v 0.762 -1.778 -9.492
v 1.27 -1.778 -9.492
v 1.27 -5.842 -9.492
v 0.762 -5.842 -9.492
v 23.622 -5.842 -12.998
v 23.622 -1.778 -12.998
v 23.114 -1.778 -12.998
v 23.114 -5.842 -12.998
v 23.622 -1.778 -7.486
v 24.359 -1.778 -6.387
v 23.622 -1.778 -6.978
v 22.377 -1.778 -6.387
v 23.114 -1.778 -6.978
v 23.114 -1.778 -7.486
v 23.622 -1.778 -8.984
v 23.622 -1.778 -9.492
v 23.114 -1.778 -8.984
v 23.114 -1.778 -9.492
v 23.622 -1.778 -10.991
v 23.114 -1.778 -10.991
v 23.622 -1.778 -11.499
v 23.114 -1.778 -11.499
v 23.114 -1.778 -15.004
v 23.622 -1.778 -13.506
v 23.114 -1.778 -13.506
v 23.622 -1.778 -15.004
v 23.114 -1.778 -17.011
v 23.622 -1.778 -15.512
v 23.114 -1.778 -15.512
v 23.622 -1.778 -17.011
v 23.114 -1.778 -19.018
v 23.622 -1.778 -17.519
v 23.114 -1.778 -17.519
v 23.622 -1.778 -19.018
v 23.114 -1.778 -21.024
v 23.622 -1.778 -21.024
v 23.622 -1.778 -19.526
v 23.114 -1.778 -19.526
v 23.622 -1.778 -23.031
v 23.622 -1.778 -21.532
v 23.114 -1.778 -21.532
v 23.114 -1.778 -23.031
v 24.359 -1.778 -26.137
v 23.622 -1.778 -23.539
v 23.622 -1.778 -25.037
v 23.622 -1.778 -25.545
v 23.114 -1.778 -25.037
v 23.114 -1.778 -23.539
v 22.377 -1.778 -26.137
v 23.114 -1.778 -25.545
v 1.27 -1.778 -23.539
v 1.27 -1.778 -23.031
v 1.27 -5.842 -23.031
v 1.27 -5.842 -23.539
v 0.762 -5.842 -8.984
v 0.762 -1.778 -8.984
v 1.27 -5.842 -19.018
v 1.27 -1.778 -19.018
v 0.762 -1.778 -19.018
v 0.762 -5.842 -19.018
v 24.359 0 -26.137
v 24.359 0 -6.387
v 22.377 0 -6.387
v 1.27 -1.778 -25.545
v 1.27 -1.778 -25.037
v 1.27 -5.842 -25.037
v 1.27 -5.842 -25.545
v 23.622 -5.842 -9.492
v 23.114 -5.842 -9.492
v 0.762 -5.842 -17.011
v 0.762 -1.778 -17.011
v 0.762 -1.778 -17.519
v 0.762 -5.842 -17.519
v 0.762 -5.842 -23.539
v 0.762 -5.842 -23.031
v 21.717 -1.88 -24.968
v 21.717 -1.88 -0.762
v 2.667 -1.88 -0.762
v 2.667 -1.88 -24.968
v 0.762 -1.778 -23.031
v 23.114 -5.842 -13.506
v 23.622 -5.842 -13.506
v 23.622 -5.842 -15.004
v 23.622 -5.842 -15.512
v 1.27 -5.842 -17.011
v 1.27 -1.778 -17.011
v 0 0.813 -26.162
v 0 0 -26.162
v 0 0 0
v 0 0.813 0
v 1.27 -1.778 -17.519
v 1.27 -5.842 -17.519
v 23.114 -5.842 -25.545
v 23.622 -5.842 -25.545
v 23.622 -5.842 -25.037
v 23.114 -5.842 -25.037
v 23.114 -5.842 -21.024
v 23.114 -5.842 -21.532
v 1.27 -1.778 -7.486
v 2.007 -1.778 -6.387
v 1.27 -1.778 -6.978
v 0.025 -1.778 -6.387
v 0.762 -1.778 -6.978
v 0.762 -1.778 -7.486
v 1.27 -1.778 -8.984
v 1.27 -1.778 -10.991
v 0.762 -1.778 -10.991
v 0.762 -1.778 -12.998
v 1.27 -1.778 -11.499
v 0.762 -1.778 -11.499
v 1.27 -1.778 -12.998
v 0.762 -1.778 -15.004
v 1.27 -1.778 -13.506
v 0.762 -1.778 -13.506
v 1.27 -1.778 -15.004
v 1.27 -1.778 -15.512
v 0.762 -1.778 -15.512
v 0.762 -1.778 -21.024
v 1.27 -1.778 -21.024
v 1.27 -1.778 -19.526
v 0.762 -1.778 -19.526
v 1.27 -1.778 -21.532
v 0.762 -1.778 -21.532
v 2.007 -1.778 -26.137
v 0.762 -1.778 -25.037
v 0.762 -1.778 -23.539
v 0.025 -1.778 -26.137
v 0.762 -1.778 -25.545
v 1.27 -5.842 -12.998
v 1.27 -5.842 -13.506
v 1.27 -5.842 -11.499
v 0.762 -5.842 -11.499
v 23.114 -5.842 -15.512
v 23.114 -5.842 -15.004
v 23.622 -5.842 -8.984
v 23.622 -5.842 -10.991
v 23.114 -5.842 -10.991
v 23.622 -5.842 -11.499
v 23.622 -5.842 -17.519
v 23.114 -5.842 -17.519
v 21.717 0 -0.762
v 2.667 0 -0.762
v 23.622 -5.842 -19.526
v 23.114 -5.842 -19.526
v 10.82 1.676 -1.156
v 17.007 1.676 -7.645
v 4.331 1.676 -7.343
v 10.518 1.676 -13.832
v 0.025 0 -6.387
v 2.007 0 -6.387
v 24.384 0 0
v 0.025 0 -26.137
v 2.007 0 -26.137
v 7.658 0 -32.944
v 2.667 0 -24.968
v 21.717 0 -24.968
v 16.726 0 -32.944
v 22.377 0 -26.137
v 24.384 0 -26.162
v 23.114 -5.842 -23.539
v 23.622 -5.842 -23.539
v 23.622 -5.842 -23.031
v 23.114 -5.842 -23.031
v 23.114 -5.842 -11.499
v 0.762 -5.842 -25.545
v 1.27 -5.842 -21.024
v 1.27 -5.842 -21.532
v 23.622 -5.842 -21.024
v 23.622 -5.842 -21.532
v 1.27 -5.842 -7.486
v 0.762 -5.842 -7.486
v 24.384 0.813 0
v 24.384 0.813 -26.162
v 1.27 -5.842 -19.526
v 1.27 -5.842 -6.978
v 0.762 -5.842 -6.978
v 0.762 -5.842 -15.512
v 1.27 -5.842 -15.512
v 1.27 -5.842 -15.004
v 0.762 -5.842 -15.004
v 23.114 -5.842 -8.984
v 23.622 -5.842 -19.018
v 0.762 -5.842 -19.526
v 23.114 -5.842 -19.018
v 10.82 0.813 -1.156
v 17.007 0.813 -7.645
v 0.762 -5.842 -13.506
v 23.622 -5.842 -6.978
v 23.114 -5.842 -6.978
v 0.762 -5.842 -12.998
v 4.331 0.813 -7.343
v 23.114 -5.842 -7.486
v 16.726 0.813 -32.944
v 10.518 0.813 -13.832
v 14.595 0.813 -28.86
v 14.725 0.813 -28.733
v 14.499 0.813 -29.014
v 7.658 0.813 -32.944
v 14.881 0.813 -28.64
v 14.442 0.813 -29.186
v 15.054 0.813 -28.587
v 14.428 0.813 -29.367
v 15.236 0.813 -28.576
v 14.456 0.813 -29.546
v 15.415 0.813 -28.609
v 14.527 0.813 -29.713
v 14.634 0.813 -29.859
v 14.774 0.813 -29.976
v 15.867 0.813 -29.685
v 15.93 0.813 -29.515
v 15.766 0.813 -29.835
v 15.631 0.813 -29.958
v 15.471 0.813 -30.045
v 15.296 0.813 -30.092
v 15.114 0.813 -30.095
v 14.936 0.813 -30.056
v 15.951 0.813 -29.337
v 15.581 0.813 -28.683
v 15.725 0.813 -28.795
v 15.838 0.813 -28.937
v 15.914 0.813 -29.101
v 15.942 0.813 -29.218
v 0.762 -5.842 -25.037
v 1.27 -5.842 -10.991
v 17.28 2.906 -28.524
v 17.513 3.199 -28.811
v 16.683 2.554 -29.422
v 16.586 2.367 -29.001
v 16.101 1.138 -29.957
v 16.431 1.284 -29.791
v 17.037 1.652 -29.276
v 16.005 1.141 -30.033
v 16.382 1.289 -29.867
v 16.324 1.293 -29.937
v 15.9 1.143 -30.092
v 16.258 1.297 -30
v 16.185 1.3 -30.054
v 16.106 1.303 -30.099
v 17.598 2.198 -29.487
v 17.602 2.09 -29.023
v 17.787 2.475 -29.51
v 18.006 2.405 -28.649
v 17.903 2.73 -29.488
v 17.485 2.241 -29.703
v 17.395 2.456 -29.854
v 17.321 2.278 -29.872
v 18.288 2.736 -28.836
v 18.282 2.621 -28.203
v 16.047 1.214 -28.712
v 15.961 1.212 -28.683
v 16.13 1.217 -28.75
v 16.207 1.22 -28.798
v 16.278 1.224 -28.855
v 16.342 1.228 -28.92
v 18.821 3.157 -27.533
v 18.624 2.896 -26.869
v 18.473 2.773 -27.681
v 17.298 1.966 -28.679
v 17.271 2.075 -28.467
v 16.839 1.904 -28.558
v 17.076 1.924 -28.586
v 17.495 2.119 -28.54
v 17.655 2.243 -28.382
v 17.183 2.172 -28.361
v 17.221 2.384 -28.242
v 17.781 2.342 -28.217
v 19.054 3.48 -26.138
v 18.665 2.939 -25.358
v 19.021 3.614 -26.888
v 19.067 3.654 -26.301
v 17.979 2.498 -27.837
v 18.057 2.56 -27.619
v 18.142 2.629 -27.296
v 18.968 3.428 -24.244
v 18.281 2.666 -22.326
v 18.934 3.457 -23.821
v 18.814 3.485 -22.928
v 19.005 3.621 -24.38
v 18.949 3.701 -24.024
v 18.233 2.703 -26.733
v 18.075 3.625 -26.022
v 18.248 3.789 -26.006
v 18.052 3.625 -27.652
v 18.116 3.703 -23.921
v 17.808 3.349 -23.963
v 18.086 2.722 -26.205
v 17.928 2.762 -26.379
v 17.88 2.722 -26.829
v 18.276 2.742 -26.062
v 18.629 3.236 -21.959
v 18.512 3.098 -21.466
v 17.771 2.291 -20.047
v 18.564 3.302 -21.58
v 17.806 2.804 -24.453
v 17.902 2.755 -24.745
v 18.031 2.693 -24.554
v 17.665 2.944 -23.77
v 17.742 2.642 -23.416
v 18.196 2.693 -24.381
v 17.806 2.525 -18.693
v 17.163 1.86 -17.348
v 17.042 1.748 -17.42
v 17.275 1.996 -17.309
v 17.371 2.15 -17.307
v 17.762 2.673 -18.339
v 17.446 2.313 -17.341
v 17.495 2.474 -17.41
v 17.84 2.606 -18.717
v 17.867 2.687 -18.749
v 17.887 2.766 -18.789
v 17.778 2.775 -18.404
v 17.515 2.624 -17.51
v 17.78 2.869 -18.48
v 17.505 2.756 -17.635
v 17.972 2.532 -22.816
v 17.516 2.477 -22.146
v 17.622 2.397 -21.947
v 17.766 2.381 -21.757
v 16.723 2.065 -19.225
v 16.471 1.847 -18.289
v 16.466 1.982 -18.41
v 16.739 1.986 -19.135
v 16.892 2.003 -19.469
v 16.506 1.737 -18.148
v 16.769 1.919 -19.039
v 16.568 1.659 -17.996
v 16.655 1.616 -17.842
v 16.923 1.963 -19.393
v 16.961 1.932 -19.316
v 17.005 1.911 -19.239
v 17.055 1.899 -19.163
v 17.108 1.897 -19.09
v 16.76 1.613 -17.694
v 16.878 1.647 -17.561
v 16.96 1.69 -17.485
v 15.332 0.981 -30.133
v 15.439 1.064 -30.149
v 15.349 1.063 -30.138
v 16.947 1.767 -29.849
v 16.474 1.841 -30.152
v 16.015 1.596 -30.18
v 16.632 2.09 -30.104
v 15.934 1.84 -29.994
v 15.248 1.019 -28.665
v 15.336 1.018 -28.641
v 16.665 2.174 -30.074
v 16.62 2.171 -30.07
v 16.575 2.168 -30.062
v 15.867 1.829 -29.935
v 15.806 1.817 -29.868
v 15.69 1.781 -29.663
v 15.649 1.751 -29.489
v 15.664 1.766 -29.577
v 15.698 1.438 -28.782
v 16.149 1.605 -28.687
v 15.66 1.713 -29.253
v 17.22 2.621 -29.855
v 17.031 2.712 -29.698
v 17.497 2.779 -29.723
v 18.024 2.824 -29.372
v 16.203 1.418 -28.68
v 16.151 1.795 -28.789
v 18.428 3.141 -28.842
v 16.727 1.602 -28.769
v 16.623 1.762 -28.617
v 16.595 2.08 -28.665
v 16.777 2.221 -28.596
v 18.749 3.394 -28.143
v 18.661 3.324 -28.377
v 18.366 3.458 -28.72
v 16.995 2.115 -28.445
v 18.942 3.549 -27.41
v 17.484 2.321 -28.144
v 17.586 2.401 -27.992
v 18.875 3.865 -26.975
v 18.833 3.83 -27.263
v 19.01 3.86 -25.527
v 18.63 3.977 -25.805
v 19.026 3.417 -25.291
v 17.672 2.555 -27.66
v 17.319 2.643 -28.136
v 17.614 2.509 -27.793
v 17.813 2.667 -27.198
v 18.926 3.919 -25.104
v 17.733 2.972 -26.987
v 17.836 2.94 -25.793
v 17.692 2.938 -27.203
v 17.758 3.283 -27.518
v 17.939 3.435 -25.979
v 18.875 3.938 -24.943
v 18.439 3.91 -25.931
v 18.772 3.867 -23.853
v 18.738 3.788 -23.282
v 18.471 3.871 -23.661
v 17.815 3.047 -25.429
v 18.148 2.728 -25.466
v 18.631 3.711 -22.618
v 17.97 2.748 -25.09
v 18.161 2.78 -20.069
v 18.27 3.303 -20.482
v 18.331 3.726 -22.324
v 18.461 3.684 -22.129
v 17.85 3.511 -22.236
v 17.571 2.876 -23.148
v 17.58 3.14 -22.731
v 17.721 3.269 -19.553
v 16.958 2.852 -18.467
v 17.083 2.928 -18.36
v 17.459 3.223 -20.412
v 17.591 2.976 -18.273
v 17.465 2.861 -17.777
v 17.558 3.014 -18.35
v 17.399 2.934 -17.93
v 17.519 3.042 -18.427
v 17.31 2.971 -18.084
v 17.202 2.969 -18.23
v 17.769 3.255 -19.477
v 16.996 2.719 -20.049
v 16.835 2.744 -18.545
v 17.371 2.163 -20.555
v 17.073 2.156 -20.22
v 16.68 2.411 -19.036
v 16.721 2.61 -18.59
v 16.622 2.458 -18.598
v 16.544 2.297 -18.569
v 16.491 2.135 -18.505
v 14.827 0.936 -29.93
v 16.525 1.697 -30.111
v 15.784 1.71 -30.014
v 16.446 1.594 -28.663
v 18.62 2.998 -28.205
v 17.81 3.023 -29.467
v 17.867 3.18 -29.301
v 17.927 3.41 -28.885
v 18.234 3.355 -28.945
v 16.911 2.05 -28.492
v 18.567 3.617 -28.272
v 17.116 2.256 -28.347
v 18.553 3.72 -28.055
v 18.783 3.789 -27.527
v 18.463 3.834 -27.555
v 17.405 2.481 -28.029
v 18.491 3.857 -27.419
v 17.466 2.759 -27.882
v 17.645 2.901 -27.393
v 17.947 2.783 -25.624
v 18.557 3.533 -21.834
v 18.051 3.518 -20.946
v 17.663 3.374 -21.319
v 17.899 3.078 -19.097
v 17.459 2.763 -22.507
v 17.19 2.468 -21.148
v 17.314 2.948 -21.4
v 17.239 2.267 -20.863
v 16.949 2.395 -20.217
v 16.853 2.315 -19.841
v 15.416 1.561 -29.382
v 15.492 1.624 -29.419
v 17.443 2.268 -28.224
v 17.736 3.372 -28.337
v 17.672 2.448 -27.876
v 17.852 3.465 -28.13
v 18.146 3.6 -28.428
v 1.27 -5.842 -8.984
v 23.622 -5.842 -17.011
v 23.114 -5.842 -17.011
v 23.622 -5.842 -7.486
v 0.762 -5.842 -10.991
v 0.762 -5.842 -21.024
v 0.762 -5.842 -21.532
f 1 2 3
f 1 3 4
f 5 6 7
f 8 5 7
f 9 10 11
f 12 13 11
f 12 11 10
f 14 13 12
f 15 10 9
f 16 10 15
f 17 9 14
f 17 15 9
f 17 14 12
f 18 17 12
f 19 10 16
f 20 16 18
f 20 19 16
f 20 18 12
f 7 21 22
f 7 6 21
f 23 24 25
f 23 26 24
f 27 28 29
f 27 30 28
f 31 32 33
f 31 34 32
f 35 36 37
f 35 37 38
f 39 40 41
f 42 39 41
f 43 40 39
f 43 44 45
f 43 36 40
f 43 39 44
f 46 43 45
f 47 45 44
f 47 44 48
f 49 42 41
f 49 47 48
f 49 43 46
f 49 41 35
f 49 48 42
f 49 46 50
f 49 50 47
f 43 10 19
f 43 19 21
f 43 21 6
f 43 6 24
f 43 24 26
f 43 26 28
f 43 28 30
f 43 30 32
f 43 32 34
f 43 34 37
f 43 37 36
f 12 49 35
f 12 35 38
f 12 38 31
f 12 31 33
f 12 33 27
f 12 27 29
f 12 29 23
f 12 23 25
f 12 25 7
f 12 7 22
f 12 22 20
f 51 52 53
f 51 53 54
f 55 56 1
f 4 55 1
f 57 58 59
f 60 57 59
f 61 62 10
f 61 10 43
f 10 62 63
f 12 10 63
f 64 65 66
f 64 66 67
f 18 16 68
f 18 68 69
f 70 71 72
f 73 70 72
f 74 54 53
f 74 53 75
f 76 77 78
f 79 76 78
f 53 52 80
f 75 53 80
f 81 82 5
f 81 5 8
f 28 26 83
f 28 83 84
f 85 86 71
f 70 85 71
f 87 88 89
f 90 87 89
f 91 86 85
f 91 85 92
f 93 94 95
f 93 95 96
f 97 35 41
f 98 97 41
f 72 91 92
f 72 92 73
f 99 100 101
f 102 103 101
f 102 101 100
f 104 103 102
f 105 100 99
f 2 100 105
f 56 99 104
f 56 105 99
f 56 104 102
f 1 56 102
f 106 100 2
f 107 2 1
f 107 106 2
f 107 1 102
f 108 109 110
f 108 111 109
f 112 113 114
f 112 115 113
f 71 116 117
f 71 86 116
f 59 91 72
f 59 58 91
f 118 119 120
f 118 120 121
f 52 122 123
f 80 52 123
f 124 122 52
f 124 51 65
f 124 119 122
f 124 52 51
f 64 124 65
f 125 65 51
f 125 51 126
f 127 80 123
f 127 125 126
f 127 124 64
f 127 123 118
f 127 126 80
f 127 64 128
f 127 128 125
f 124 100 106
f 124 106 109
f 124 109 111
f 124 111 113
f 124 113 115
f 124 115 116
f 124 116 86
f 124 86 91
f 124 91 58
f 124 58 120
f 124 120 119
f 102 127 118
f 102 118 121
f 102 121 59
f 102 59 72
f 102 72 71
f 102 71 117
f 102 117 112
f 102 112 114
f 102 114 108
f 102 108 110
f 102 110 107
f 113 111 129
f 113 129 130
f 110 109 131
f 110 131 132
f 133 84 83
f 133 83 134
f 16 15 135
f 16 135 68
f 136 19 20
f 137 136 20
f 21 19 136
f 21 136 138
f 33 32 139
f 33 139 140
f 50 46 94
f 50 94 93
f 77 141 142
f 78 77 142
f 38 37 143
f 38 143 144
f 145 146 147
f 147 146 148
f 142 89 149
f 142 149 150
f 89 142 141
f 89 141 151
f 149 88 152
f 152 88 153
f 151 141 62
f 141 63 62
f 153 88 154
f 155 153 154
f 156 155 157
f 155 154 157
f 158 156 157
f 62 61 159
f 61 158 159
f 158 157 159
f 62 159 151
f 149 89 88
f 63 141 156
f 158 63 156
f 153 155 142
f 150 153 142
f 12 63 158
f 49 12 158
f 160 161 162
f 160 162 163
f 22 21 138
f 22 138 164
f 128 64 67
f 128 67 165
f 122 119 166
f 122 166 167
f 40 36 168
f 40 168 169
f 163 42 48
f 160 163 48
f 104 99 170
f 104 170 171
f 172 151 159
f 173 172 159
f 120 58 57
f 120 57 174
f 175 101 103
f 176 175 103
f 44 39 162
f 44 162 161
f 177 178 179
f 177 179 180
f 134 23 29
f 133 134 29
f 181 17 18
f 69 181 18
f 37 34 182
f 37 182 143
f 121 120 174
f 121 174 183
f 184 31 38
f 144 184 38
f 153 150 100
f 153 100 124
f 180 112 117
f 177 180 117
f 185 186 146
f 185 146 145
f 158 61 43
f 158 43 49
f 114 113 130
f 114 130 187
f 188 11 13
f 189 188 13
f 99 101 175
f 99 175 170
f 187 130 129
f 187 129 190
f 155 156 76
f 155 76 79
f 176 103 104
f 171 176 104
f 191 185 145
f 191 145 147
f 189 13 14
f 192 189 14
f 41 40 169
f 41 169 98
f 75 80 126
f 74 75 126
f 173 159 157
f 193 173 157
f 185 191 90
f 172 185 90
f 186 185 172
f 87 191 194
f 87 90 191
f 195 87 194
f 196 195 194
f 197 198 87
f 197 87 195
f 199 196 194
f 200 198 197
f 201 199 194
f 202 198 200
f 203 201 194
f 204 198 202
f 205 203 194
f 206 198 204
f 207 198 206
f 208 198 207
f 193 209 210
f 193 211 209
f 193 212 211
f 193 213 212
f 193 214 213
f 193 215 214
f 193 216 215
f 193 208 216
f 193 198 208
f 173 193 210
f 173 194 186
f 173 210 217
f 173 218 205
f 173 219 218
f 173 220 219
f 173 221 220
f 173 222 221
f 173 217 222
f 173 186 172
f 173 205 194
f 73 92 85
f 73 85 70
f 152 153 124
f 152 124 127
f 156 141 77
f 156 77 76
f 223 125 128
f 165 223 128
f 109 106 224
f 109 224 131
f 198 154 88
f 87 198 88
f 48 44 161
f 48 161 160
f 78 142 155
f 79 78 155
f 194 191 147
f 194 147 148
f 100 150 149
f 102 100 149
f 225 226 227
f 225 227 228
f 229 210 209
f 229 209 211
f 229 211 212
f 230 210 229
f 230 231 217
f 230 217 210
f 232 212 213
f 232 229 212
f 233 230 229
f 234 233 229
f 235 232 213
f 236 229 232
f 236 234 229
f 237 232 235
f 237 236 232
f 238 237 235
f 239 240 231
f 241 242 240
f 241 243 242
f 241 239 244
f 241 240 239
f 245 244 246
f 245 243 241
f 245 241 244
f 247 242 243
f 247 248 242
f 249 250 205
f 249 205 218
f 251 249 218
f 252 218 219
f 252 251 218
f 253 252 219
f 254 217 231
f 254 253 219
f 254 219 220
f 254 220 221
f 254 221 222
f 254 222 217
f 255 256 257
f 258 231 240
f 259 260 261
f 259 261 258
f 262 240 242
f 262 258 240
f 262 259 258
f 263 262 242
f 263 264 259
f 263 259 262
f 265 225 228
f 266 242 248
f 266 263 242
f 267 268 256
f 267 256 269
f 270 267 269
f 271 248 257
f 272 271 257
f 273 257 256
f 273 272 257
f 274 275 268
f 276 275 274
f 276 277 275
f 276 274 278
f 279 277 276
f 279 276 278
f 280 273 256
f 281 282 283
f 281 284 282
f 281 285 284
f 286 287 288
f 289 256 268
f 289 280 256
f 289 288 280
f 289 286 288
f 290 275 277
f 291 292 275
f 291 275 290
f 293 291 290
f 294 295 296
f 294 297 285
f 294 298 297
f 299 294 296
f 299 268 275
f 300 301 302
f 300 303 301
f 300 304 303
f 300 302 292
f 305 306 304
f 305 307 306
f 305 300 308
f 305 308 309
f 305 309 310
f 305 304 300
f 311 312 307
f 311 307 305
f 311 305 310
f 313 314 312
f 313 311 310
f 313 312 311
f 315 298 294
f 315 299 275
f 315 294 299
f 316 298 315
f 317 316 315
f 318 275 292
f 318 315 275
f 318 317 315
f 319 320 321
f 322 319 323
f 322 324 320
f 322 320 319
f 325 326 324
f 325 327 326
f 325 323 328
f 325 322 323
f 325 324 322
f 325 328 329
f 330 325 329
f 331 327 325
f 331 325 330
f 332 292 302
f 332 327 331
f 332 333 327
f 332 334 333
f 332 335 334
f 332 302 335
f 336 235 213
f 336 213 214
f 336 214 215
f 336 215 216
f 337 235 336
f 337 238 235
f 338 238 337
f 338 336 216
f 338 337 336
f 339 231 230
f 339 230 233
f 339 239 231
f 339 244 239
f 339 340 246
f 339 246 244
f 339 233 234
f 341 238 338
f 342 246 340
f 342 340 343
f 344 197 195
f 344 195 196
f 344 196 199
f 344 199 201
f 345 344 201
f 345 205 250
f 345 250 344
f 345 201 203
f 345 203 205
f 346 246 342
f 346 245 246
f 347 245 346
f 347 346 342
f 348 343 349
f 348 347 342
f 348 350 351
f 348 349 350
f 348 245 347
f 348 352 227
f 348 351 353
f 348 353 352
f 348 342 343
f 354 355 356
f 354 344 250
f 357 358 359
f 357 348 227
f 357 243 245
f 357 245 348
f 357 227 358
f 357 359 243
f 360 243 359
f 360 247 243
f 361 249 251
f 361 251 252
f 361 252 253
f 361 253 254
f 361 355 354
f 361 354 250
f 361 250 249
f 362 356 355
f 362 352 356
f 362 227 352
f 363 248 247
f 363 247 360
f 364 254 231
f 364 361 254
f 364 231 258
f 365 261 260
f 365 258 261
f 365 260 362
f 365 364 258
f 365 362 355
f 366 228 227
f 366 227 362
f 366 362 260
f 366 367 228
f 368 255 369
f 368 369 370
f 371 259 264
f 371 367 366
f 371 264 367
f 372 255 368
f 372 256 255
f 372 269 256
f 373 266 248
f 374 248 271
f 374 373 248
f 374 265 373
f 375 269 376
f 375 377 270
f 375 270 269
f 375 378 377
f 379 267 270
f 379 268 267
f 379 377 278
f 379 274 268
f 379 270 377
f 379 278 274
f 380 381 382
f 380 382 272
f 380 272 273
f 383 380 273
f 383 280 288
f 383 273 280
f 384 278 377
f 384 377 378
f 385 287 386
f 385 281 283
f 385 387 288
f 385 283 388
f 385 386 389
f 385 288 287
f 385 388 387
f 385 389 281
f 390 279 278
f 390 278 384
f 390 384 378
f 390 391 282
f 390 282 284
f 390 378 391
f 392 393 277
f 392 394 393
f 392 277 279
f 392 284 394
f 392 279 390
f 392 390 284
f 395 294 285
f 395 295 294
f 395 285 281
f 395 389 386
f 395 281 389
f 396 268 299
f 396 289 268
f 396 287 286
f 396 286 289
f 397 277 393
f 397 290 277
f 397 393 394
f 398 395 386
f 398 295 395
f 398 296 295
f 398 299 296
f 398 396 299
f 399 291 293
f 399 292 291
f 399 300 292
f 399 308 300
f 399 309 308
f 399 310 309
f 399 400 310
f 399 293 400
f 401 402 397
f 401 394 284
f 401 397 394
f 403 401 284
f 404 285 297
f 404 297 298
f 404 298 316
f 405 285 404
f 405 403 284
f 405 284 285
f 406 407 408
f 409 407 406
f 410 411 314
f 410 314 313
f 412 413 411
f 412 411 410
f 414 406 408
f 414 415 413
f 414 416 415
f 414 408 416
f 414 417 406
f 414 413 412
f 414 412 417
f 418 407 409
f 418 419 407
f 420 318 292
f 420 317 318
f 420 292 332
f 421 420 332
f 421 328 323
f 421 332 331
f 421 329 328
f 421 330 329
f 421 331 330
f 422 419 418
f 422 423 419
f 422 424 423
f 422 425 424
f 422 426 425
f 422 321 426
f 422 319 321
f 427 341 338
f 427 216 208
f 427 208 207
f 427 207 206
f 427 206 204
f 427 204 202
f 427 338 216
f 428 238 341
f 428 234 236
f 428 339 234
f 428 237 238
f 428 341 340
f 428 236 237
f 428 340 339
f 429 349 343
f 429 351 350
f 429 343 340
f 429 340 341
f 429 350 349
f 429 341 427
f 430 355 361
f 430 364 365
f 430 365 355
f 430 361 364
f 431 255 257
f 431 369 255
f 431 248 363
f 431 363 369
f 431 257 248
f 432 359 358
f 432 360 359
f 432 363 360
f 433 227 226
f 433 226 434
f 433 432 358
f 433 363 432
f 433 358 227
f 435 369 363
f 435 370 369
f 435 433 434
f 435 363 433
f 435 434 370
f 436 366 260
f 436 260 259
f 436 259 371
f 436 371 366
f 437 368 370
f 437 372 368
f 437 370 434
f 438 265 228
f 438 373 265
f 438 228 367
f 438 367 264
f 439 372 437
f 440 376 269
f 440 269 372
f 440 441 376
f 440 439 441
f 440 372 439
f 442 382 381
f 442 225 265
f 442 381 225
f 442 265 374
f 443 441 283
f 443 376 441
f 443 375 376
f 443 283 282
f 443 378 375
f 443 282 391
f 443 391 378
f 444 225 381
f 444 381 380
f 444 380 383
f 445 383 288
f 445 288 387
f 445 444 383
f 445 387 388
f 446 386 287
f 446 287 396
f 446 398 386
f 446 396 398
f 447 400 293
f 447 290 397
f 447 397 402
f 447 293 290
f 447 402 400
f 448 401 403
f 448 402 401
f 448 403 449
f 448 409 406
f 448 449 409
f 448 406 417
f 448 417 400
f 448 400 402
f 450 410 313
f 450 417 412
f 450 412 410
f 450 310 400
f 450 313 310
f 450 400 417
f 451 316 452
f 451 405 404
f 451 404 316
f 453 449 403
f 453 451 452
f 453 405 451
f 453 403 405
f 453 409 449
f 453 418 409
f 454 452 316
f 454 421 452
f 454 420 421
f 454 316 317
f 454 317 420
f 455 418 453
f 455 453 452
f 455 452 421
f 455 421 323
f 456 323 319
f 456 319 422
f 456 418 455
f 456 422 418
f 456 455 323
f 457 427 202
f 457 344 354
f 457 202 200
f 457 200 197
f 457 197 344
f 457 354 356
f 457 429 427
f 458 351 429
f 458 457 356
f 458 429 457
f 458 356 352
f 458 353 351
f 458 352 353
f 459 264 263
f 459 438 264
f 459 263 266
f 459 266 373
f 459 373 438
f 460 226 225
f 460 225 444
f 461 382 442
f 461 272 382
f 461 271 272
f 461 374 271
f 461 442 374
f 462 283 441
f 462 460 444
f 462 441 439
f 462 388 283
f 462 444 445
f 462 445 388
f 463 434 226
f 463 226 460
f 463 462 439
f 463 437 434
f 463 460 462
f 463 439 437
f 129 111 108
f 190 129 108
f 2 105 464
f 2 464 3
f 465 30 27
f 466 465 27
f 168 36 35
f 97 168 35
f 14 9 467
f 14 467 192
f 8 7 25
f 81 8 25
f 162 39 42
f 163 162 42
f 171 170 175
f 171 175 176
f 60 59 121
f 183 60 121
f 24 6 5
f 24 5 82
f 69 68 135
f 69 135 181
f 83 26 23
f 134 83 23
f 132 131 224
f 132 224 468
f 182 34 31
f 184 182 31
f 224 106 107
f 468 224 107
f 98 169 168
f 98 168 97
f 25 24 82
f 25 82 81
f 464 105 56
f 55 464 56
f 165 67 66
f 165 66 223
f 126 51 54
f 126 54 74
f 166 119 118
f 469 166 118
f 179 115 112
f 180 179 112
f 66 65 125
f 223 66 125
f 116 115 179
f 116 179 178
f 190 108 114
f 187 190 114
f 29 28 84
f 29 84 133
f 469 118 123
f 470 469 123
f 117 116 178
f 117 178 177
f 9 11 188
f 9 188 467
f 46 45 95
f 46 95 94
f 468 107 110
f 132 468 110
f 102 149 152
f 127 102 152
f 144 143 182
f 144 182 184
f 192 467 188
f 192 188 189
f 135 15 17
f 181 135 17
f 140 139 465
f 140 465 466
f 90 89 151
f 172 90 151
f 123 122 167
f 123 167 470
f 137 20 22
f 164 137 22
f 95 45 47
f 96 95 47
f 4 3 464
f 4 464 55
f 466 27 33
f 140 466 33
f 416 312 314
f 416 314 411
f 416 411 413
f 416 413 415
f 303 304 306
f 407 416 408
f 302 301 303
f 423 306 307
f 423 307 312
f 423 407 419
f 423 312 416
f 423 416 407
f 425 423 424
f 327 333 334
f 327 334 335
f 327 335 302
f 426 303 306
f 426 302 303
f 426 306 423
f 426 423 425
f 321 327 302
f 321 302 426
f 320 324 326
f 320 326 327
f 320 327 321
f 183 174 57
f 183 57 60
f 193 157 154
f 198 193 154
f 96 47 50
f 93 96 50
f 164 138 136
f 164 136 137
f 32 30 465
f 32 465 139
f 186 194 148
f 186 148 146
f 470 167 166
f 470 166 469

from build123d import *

# Parameters (mm, degrees)
BOSS_EXTRUDE1_DEPTH = 0.8128
SKETCH2_W           = 19.05
SKETCH2_H           = 24.2062
BOSS_EXTRUDE2_DEPTH = 1.8796
BOSS_EXTRUDE3_DEPTH = 0.8636
SKETCH4_W           = 1.9812
SKETCH4_H           = 19.75
BOSS_EXTRUDE4_DEPTH = 1.778
SKETCH5_W           = 0.508
SKETCH5_H           = 0.508
BOSS_EXTRUDE5_DEPTH = 4.064
SKETCH6_R           = 0.762


with BuildPart() as part:
    # Sketch1 → Boss-Extrude1 (new body)
    with BuildSketch(Plane(origin=(0, 0, 0), x_dir=(1, 0, 0), z_dir=(0, 1, 0))):
        Polygon((0, 0), (24.384, 0), (24.384, 26.162), (16.7259, 32.9438), (7.6581, 32.9438), (0, 26.162), align=None)
    extrude(amount=BOSS_EXTRUDE1_DEPTH)

    # Sketch2 → Boss-Extrude2 (add)
    with BuildSketch(Plane(origin=(0, 0, 0), x_dir=(-1, 0, 0), z_dir=(0, -1, 0))):
        with Locations((-12.192, 12.8651)):
            Rectangle(SKETCH2_W, SKETCH2_H)
    extrude(amount=BOSS_EXTRUDE2_DEPTH)

    # Sketch3 → Boss-Extrude3 (add)
    with BuildSketch(Plane(origin=(0, 0.8128, 0), x_dir=(1, 0, 0), z_dir=(0, 1, 0))):
        Polygon((4.3307, 7.342503403), (10.517503403, 13.832203403), (17.007203403, 7.6454), (10.8204, 1.1557), align=None)
    extrude(amount=BOSS_EXTRUDE3_DEPTH)

    # Sketch4 → Boss-Extrude4 (add)
    with BuildSketch(Plane(origin=(0, 0, 0), x_dir=(-1, 0, 0), z_dir=(0, -1, 0))):
        with Locations((-1.016, 16.2616)):
            Rectangle(SKETCH4_W, SKETCH4_H)
        with Locations((-23.368, 16.2616)):
            Rectangle(SKETCH4_W, SKETCH4_H)
    extrude(amount=BOSS_EXTRUDE4_DEPTH)

    # Sketch5 → Boss-Extrude5 (add)
    with BuildSketch(Plane(origin=(0, -1.778, 0), x_dir=(-1, 0, 0), z_dir=(0, -1, 0))):
        with Locations((-23.368, 25.2913)):
            Rectangle(SKETCH5_W, SKETCH5_H)
        with Locations((-23.368, 23.2847)):
            Rectangle(SKETCH5_W, SKETCH5_H)
        with Locations((-23.368, 21.2781)):
            Rectangle(SKETCH5_W, SKETCH5_H)
        with Locations((-23.368, 19.2715)):
            Rectangle(SKETCH5_W, SKETCH5_H)
        with Locations((-23.368, 17.2649)):
            Rectangle(SKETCH5_W, SKETCH5_H)
        with Locations((-23.368, 15.2583)):
            Rectangle(SKETCH5_W, SKETCH5_H)
        with Locations((-23.368, 13.2517)):
            Rectangle(SKETCH5_W, SKETCH5_H)
        with Locations((-23.368, 11.2451)):
            Rectangle(SKETCH5_W, SKETCH5_H)
        with Locations((-23.368, 9.2385)):
            Rectangle(SKETCH5_W, SKETCH5_H)
        with Locations((-23.368, 7.2319)):
            Rectangle(SKETCH5_W, SKETCH5_H)
        with Locations((-1.016, 7.2319)):
            Rectangle(SKETCH5_W, SKETCH5_H)
        with Locations((-1.016, 9.2385)):
            Rectangle(SKETCH5_W, SKETCH5_H)
        with Locations((-1.016, 11.2451)):
            Rectangle(SKETCH5_W, SKETCH5_H)
        with Locations((-1.016, 13.2517)):
            Rectangle(SKETCH5_W, SKETCH5_H)
        with Locations((-1.016, 15.2583)):
            Rectangle(SKETCH5_W, SKETCH5_H)
        with Locations((-1.016, 17.2649)):
            Rectangle(SKETCH5_W, SKETCH5_H)
        with Locations((-1.016, 19.2715)):
            Rectangle(SKETCH5_W, SKETCH5_H)
        with Locations((-1.016, 21.2781)):
            Rectangle(SKETCH5_W, SKETCH5_H)
        with Locations((-1.016, 23.2847)):
            Rectangle(SKETCH5_W, SKETCH5_H)
        with Locations((-1.016, 25.2913)):
            Rectangle(SKETCH5_W, SKETCH5_H)
    extrude(amount=BOSS_EXTRUDE5_DEPTH)

    # Sweep2: sweep along a curve in space
    with BuildLine() as sweep2_path:
        add(Edge.make_bspline(
            [(15.1892, 0.8128, -29.337), (20.622976284, 5.000023383, -30.448552109), (16.989821563, 2.292008104, -17.951240105)],
            knots=[0, 0, 0, 1, 1, 1], degree=2))
    # Sketch6 → Sweep2 (sweep)
    with BuildSketch(Plane(origin=(0, 0.8128, 0), x_dir=(1, 0, 0), z_dir=(0, 1, 0))):
        with Locations((15.1892, 29.337)):
            Circle(SKETCH6_R)
    sweep(path=sweep2_path.line)


solid = part.part
